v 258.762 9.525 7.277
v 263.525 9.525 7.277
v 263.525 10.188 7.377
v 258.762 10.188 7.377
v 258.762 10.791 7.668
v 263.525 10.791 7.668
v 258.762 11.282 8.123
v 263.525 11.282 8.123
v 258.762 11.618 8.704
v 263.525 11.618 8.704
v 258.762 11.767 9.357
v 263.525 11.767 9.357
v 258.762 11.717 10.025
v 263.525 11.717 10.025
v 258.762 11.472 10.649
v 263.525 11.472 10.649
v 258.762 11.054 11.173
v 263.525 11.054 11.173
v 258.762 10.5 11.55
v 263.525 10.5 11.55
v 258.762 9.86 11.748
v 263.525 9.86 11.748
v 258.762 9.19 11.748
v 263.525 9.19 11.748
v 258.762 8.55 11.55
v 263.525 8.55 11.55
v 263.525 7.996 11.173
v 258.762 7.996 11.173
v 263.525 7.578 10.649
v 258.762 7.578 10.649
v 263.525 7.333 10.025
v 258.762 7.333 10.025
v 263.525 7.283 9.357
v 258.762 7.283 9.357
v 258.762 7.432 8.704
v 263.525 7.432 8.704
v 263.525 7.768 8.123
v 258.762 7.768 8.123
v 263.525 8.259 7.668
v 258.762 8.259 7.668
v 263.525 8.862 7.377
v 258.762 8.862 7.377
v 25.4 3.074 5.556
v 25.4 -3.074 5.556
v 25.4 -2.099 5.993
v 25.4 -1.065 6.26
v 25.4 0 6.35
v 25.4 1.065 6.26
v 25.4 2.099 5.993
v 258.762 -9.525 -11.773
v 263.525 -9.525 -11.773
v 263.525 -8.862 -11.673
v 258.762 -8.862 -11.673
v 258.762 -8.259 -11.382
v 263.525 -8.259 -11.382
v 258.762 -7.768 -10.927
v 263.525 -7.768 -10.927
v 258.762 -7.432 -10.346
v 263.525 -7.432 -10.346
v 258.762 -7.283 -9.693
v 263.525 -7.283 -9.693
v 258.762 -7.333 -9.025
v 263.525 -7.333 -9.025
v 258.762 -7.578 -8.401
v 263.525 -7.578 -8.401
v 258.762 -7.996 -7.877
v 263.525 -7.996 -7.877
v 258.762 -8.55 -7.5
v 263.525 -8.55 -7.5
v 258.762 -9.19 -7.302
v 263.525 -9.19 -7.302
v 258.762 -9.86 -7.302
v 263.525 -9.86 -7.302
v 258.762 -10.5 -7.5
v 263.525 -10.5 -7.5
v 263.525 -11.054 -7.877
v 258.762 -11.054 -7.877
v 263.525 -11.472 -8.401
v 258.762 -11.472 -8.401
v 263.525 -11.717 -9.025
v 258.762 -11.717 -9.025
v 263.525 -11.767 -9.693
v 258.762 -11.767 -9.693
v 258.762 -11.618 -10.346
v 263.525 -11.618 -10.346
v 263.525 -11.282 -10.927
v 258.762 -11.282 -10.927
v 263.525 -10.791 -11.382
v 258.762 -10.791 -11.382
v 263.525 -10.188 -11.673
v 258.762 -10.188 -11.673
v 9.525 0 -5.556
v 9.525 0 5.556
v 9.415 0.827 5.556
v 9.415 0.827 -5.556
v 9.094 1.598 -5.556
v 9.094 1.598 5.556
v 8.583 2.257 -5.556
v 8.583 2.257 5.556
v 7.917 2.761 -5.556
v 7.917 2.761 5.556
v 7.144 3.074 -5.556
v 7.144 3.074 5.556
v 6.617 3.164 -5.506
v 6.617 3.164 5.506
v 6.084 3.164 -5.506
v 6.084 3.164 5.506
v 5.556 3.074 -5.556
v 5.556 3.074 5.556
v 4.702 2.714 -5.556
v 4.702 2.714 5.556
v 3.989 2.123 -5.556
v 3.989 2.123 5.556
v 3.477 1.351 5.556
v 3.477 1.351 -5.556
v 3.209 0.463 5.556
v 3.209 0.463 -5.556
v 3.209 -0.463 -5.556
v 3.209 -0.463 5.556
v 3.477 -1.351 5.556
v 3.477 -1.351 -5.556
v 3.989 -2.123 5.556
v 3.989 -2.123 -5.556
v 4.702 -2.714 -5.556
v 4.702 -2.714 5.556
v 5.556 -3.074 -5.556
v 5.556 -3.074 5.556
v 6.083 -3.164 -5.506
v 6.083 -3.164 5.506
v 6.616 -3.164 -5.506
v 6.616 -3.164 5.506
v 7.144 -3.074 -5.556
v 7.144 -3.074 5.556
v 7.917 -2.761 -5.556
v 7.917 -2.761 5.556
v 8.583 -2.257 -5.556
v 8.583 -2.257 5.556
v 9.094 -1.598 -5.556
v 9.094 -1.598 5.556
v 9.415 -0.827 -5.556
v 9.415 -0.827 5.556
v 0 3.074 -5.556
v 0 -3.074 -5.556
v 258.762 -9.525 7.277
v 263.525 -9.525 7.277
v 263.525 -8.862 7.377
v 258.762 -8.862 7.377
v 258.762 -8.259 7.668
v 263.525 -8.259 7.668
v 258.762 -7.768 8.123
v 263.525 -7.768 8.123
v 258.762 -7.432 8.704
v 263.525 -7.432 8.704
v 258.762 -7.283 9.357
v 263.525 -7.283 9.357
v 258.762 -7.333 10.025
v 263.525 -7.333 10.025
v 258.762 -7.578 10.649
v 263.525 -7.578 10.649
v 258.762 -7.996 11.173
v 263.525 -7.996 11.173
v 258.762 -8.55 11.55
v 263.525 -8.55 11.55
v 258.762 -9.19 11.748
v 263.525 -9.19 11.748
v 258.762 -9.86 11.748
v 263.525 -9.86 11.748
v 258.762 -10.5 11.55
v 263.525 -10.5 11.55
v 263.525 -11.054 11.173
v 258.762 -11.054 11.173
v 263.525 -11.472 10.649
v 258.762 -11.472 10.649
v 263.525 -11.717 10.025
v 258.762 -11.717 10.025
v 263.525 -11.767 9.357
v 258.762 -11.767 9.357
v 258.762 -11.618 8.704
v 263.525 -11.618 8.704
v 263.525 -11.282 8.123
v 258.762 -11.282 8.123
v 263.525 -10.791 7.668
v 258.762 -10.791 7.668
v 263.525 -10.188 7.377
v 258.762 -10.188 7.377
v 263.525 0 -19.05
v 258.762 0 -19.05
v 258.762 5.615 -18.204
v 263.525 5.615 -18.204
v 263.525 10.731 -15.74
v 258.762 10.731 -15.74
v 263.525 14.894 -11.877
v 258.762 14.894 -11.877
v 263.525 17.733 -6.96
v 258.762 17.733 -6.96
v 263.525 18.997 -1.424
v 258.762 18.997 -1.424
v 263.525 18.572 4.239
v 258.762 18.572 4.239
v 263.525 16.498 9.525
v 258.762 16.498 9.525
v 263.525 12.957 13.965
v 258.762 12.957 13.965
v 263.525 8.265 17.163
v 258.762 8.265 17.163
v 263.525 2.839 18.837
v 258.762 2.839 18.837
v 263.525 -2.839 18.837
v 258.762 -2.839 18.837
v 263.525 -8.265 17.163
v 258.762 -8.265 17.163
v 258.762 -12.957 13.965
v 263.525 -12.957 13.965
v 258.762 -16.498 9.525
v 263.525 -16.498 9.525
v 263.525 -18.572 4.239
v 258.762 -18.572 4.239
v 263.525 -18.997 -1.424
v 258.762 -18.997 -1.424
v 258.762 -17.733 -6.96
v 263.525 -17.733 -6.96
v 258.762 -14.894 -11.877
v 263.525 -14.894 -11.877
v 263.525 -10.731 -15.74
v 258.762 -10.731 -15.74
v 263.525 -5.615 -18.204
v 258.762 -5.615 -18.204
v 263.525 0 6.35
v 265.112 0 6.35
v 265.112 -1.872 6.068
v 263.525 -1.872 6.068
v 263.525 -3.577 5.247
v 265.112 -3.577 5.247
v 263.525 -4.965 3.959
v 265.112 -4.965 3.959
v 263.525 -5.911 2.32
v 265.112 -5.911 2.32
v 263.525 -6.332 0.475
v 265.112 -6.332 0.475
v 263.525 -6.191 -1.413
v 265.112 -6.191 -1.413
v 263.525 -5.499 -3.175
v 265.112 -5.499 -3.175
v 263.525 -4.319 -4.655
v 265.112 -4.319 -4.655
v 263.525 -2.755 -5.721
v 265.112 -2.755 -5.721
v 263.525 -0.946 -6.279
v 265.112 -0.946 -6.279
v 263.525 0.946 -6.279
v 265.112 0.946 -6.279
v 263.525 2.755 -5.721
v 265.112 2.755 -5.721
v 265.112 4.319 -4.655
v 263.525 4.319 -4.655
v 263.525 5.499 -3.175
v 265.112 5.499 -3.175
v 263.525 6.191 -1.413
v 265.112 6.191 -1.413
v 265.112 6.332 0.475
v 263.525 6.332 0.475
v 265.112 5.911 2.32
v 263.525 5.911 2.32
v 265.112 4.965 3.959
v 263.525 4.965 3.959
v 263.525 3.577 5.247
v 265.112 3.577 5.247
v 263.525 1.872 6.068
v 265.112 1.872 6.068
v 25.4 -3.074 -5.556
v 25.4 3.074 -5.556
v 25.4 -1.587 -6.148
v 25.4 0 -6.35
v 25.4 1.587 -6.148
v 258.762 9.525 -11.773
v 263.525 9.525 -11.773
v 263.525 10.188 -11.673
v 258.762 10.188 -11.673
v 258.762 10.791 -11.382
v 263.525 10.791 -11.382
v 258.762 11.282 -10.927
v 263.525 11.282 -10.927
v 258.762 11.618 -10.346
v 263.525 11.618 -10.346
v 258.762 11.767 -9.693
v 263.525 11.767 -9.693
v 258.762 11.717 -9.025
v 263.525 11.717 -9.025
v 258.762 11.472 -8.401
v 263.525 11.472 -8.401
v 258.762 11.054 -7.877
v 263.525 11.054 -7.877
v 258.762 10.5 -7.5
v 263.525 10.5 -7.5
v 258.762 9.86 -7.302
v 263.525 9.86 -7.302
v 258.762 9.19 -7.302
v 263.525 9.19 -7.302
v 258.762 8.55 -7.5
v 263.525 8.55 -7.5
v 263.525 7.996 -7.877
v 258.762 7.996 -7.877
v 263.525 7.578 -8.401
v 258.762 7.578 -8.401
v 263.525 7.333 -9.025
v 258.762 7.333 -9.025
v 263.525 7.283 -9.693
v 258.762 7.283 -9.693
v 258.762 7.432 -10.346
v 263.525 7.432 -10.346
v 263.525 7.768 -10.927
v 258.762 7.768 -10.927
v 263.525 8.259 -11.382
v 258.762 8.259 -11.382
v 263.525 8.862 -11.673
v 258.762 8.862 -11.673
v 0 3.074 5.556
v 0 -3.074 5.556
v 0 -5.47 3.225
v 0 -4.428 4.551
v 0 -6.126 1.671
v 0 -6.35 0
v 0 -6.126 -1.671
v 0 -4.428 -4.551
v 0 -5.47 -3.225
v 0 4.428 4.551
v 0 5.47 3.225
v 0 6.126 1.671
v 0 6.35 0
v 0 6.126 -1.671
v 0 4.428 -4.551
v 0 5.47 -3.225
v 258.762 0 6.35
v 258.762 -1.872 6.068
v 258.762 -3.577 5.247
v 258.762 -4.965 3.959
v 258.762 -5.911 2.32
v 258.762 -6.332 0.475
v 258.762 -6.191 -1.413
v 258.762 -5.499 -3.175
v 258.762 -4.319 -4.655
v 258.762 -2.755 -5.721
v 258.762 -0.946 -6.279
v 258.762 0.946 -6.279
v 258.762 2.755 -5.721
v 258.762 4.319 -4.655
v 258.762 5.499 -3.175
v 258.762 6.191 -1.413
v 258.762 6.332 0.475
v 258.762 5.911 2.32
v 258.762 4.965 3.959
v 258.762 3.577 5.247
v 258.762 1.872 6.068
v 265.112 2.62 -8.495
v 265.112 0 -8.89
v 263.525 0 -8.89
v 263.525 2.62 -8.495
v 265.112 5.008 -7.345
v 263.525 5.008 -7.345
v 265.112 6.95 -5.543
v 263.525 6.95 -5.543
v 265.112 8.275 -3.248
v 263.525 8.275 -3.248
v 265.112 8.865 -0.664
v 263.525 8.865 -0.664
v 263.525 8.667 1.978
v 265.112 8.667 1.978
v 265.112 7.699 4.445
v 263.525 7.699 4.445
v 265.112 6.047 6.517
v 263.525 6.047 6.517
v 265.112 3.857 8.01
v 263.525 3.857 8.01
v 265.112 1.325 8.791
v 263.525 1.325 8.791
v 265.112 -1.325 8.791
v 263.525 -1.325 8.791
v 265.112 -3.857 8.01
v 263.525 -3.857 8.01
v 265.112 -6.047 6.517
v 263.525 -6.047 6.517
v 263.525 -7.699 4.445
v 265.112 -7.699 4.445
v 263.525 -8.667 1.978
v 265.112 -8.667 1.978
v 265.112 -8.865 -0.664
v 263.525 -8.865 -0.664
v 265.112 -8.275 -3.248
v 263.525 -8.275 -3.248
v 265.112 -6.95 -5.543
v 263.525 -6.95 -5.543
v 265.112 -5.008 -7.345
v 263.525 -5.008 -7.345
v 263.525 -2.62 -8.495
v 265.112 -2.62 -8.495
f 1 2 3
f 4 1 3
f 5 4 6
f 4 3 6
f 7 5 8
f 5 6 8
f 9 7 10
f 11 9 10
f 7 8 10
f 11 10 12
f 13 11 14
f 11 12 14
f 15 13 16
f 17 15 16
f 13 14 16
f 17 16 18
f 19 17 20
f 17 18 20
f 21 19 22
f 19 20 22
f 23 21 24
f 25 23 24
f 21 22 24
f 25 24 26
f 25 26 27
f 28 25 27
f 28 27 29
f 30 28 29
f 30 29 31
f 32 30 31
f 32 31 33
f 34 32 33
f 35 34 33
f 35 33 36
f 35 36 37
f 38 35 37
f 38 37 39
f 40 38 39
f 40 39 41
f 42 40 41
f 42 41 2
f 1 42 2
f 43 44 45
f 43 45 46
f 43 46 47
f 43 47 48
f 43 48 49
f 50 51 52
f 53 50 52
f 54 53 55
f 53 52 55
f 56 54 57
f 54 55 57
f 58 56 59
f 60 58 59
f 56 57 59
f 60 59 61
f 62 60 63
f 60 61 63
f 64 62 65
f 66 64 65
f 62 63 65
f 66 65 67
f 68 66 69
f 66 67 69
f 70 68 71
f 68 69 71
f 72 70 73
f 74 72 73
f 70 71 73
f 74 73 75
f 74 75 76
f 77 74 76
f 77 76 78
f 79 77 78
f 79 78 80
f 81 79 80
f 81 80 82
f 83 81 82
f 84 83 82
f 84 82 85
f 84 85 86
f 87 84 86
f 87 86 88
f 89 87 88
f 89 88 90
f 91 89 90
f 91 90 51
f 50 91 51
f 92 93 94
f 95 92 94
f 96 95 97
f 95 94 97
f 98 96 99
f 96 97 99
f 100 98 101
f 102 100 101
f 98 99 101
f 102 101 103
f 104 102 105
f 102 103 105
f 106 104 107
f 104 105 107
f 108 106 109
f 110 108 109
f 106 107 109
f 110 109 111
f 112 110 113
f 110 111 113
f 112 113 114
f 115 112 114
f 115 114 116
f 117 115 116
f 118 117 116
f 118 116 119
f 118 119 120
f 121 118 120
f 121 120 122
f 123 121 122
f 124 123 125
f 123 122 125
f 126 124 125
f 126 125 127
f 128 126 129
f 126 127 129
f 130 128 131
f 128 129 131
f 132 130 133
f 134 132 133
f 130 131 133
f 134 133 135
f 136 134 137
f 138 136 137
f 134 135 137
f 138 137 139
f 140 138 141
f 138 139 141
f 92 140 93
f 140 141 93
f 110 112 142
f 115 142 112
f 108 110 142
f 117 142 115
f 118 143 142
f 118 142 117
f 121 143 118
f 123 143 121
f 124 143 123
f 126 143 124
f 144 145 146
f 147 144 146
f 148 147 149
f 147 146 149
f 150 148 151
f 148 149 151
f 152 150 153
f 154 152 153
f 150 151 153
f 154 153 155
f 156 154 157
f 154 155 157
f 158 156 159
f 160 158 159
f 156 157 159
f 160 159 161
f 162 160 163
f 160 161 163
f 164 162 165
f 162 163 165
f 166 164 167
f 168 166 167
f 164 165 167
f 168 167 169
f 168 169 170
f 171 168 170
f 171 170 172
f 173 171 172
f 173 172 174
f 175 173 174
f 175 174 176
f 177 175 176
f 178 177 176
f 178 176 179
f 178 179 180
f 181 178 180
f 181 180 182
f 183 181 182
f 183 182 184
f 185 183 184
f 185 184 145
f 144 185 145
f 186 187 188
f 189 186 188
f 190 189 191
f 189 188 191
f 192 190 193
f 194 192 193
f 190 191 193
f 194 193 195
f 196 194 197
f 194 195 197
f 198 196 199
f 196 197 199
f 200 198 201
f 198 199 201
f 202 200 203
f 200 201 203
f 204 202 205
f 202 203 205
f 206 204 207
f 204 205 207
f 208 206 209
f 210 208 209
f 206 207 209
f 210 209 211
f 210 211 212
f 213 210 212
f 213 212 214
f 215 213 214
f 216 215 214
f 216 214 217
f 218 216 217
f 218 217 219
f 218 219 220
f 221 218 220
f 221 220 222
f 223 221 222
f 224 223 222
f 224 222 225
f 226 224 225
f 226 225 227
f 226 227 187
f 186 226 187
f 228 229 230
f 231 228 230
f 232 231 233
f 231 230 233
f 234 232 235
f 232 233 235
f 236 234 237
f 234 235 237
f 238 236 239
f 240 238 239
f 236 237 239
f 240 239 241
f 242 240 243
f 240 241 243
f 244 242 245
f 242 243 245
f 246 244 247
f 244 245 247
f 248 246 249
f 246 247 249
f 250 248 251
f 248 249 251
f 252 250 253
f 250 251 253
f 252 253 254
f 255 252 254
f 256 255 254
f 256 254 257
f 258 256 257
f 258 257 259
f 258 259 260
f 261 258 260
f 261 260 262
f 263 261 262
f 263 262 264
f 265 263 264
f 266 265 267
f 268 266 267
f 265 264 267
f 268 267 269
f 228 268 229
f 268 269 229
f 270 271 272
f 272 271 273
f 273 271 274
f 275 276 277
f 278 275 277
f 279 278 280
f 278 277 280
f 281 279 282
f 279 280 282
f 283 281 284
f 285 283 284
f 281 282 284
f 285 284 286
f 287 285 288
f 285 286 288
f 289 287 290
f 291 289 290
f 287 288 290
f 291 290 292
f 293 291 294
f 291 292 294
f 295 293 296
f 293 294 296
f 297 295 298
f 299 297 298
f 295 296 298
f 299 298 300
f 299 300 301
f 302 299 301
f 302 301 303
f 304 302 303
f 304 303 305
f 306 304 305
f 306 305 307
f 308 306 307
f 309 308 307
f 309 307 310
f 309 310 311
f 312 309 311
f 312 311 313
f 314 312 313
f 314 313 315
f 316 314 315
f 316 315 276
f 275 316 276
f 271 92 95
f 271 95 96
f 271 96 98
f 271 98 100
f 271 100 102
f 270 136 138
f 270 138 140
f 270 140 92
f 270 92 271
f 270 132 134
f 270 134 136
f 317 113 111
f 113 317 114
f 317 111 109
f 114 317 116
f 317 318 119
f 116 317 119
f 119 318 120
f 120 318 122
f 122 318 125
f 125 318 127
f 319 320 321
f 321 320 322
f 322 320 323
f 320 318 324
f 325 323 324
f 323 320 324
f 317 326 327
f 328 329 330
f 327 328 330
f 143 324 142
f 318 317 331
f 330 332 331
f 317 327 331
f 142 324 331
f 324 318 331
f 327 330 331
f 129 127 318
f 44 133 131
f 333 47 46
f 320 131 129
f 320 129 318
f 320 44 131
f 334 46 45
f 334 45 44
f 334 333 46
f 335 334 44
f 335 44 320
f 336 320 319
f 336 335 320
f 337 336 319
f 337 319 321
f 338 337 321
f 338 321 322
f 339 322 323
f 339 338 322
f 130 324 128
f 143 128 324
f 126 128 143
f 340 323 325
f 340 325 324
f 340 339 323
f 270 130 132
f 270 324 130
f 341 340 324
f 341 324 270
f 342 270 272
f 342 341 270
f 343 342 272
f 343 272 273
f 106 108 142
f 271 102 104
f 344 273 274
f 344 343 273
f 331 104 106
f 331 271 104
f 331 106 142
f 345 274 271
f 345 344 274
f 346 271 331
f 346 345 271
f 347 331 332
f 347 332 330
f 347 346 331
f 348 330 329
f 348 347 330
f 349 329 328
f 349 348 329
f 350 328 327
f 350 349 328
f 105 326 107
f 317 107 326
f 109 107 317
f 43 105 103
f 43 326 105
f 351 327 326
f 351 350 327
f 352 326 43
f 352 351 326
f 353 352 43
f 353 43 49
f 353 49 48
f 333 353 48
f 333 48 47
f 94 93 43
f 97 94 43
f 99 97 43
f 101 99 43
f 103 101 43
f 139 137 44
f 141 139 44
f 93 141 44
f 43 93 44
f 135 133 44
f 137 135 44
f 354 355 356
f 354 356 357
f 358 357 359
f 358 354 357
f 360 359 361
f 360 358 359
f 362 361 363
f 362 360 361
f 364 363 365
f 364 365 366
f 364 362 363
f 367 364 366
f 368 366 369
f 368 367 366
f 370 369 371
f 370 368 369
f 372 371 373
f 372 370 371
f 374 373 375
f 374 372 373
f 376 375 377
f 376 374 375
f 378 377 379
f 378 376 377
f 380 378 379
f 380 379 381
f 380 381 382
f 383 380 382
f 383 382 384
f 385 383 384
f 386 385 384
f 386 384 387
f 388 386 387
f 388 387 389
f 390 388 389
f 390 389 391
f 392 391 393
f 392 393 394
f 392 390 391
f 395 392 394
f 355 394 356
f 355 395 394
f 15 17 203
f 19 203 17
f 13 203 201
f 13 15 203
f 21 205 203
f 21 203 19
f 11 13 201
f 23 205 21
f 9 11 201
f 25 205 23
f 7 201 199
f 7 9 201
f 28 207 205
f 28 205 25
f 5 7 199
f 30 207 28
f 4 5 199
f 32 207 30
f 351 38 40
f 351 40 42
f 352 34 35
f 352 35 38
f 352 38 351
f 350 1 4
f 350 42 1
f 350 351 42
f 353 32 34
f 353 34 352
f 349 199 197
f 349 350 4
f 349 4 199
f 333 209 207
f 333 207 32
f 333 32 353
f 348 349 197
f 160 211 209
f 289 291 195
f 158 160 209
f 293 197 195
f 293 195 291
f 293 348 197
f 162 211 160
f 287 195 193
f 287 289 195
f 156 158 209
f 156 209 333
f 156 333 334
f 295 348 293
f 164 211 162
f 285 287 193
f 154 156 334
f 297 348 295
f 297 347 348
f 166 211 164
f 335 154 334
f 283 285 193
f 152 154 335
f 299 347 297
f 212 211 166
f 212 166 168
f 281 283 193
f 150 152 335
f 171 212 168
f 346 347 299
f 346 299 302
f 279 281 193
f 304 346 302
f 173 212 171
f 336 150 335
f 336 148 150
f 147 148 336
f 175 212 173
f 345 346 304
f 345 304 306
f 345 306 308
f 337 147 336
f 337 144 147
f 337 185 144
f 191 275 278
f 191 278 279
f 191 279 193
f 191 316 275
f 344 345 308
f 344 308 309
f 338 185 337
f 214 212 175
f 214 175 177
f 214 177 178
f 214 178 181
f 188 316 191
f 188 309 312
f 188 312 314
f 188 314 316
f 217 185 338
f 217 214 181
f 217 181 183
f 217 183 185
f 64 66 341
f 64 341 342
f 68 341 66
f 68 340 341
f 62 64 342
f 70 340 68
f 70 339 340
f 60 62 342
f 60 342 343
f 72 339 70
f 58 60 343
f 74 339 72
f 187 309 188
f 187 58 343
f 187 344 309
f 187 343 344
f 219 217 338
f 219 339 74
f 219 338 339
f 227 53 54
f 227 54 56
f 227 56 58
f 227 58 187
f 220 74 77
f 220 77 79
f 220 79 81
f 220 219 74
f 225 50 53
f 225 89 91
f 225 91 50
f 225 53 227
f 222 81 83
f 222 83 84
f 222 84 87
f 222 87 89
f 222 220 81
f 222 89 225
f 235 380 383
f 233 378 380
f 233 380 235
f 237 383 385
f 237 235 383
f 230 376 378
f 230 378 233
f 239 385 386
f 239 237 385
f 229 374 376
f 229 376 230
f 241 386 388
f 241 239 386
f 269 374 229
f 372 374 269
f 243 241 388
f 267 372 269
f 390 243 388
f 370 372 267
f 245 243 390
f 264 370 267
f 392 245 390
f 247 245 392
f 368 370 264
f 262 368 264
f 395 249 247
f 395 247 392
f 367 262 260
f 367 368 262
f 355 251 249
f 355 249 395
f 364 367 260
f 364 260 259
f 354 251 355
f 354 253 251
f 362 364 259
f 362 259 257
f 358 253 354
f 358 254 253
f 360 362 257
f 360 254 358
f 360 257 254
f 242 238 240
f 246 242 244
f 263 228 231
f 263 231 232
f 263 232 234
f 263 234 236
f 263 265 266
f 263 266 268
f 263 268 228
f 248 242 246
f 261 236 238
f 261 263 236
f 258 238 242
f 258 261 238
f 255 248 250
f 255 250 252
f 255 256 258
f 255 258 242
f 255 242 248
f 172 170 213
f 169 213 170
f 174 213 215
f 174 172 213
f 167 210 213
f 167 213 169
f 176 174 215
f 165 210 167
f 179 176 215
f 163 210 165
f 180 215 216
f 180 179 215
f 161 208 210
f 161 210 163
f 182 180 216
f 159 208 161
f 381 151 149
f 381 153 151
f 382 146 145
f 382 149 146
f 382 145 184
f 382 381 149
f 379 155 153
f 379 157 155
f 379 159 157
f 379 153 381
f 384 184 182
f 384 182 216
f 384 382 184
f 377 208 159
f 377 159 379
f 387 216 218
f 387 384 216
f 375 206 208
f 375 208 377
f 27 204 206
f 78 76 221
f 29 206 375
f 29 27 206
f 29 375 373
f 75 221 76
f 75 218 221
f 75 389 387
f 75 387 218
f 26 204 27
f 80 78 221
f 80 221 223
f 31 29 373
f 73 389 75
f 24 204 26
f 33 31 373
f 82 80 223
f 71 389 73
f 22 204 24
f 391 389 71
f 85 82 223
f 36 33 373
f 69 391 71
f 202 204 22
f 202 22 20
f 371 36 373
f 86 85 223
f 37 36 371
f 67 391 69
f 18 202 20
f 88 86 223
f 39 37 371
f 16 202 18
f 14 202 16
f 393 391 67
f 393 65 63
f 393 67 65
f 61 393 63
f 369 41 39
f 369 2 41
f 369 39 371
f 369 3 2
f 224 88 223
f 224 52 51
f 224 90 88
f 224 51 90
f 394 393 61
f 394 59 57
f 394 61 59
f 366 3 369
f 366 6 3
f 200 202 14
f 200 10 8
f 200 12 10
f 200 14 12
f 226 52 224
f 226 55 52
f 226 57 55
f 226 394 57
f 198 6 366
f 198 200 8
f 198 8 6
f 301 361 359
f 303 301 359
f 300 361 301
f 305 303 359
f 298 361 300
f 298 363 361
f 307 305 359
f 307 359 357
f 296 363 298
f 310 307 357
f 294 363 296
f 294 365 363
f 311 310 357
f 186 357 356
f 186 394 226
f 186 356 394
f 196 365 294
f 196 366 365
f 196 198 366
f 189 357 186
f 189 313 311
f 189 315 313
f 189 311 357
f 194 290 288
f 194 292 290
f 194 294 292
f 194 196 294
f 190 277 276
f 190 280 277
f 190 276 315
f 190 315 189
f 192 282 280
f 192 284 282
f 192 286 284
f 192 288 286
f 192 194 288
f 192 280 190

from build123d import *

# Parameters (mm, degrees)
SKETCH1_R                       = 19.05
BOSS_EXTRUDE1_DEPTH             = 263.525
SKETCH2_W                       = 258.7625
SKETCH2_H                       = 12.7
CUT_EXTRUDE1_DEPTH              = 265.898528922
CUT_EXTRUDE1_DEPTH_BACK         = 265.898528922
SKETCH8_W                       = 25.4
SKETCH8_H                       = 0.79375
F_1_1_DIAMETER_HOLE2_D          = 6.35
F_16_0_177_DIAMETER_HOLE1_D     = 4.4958
F_16_0_177_DIAMETER_HOLE1_DEPTH = 25.4
F_16_0_177_DIAMETER_HOLE1_TIP   = 1.350674586
BOSS_EXTRUDE2_START             = 1.5875
SKETCH15_R                      = 8.89
SKETCH15_R_2                    = 6.35
BOSS_EXTRUDE2_DEPTH             = 1.5875


with BuildPart() as part:
    # Sketch1 → Boss-Extrude1 (new body)
    with BuildSketch(Plane(origin=(0, 0, 0), x_dir=(0, 0, -1), z_dir=(1, 0, 0))):
        Circle(SKETCH1_R)
    extrude(amount=BOSS_EXTRUDE1_DEPTH)

    # Sketch2 → Cut-Revolve1 (revolve, cut)
    with BuildSketch(Plane.XY, mode=Mode.PRIVATE) as cut_revolve1_sk:
        with Locations((129.38125, 12.7)):
            Rectangle(SKETCH2_W, SKETCH2_H)
    revolve(cut_revolve1_sk.sketch.rotate(Axis((-16.52066387, 0, 0), (1, 0, 0)), 90), axis=Axis((-16.52066387, 0, 0), (1, 0, 0)), mode=Mode.SUBTRACT)

    # Sketch8 → Cut-Extrude1 (cut, two sides: drawn at the far end of the back side and taken through both)
    with BuildSketch(Plane(origin=(0, 0, 0), x_dir=(1, 0, 0), z_dir=(0, 1, 0)).offset(-CUT_EXTRUDE1_DEPTH_BACK)):
        with Locations((12.7, 5.953125)):
            Rectangle(SKETCH8_W, SKETCH8_H)
        with Locations((12.7, -5.953125)):
            Rectangle(SKETCH8_W, SKETCH8_H)
    extrude(amount=CUT_EXTRUDE1_DEPTH + CUT_EXTRUDE1_DEPTH_BACK, mode=Mode.SUBTRACT)

    # 1 (1) Diameter Hole2 (through all)
    with Locations(Plane(origin=(0, 0, -5.55625), x_dir=(-1, 0, 0), z_dir=(0, 0, -1))):
        with Locations((-6.35, 0)):
            Hole(F_1_1_DIAMETER_HOLE2_D / 2)

    # #16 (0.177) Diameter Hole1
    with Locations(Plane.ZY.offset(-258.7625)):
        with Locations((9.525, 9.525), (-9.525, -9.525), (-9.525, 9.525), (9.525, -9.525)):
            Hole(F_16_0_177_DIAMETER_HOLE1_D / 2, depth=F_16_0_177_DIAMETER_HOLE1_DEPTH)
            with Locations((0, 0, -(F_16_0_177_DIAMETER_HOLE1_DEPTH + F_16_0_177_DIAMETER_HOLE1_TIP / 2))):  # 118° drill point
                Cone(0, F_16_0_177_DIAMETER_HOLE1_D / 2, F_16_0_177_DIAMETER_HOLE1_TIP, mode=Mode.SUBTRACT)

    # Sketch15 → Boss-Extrude2 (add)
    with BuildSketch(Plane(origin=(263.525, 0, 0), x_dir=(0, 0, -1), z_dir=(1, 0, 0)).offset(BOSS_EXTRUDE2_START)):
        Circle(SKETCH15_R)
        with Locations(Location((0, 0, 0), (0, 0, 180))):
            Circle(SKETCH15_R_2, mode=Mode.SUBTRACT)
    extrude(amount=-BOSS_EXTRUDE2_DEPTH)


solid = part.part
